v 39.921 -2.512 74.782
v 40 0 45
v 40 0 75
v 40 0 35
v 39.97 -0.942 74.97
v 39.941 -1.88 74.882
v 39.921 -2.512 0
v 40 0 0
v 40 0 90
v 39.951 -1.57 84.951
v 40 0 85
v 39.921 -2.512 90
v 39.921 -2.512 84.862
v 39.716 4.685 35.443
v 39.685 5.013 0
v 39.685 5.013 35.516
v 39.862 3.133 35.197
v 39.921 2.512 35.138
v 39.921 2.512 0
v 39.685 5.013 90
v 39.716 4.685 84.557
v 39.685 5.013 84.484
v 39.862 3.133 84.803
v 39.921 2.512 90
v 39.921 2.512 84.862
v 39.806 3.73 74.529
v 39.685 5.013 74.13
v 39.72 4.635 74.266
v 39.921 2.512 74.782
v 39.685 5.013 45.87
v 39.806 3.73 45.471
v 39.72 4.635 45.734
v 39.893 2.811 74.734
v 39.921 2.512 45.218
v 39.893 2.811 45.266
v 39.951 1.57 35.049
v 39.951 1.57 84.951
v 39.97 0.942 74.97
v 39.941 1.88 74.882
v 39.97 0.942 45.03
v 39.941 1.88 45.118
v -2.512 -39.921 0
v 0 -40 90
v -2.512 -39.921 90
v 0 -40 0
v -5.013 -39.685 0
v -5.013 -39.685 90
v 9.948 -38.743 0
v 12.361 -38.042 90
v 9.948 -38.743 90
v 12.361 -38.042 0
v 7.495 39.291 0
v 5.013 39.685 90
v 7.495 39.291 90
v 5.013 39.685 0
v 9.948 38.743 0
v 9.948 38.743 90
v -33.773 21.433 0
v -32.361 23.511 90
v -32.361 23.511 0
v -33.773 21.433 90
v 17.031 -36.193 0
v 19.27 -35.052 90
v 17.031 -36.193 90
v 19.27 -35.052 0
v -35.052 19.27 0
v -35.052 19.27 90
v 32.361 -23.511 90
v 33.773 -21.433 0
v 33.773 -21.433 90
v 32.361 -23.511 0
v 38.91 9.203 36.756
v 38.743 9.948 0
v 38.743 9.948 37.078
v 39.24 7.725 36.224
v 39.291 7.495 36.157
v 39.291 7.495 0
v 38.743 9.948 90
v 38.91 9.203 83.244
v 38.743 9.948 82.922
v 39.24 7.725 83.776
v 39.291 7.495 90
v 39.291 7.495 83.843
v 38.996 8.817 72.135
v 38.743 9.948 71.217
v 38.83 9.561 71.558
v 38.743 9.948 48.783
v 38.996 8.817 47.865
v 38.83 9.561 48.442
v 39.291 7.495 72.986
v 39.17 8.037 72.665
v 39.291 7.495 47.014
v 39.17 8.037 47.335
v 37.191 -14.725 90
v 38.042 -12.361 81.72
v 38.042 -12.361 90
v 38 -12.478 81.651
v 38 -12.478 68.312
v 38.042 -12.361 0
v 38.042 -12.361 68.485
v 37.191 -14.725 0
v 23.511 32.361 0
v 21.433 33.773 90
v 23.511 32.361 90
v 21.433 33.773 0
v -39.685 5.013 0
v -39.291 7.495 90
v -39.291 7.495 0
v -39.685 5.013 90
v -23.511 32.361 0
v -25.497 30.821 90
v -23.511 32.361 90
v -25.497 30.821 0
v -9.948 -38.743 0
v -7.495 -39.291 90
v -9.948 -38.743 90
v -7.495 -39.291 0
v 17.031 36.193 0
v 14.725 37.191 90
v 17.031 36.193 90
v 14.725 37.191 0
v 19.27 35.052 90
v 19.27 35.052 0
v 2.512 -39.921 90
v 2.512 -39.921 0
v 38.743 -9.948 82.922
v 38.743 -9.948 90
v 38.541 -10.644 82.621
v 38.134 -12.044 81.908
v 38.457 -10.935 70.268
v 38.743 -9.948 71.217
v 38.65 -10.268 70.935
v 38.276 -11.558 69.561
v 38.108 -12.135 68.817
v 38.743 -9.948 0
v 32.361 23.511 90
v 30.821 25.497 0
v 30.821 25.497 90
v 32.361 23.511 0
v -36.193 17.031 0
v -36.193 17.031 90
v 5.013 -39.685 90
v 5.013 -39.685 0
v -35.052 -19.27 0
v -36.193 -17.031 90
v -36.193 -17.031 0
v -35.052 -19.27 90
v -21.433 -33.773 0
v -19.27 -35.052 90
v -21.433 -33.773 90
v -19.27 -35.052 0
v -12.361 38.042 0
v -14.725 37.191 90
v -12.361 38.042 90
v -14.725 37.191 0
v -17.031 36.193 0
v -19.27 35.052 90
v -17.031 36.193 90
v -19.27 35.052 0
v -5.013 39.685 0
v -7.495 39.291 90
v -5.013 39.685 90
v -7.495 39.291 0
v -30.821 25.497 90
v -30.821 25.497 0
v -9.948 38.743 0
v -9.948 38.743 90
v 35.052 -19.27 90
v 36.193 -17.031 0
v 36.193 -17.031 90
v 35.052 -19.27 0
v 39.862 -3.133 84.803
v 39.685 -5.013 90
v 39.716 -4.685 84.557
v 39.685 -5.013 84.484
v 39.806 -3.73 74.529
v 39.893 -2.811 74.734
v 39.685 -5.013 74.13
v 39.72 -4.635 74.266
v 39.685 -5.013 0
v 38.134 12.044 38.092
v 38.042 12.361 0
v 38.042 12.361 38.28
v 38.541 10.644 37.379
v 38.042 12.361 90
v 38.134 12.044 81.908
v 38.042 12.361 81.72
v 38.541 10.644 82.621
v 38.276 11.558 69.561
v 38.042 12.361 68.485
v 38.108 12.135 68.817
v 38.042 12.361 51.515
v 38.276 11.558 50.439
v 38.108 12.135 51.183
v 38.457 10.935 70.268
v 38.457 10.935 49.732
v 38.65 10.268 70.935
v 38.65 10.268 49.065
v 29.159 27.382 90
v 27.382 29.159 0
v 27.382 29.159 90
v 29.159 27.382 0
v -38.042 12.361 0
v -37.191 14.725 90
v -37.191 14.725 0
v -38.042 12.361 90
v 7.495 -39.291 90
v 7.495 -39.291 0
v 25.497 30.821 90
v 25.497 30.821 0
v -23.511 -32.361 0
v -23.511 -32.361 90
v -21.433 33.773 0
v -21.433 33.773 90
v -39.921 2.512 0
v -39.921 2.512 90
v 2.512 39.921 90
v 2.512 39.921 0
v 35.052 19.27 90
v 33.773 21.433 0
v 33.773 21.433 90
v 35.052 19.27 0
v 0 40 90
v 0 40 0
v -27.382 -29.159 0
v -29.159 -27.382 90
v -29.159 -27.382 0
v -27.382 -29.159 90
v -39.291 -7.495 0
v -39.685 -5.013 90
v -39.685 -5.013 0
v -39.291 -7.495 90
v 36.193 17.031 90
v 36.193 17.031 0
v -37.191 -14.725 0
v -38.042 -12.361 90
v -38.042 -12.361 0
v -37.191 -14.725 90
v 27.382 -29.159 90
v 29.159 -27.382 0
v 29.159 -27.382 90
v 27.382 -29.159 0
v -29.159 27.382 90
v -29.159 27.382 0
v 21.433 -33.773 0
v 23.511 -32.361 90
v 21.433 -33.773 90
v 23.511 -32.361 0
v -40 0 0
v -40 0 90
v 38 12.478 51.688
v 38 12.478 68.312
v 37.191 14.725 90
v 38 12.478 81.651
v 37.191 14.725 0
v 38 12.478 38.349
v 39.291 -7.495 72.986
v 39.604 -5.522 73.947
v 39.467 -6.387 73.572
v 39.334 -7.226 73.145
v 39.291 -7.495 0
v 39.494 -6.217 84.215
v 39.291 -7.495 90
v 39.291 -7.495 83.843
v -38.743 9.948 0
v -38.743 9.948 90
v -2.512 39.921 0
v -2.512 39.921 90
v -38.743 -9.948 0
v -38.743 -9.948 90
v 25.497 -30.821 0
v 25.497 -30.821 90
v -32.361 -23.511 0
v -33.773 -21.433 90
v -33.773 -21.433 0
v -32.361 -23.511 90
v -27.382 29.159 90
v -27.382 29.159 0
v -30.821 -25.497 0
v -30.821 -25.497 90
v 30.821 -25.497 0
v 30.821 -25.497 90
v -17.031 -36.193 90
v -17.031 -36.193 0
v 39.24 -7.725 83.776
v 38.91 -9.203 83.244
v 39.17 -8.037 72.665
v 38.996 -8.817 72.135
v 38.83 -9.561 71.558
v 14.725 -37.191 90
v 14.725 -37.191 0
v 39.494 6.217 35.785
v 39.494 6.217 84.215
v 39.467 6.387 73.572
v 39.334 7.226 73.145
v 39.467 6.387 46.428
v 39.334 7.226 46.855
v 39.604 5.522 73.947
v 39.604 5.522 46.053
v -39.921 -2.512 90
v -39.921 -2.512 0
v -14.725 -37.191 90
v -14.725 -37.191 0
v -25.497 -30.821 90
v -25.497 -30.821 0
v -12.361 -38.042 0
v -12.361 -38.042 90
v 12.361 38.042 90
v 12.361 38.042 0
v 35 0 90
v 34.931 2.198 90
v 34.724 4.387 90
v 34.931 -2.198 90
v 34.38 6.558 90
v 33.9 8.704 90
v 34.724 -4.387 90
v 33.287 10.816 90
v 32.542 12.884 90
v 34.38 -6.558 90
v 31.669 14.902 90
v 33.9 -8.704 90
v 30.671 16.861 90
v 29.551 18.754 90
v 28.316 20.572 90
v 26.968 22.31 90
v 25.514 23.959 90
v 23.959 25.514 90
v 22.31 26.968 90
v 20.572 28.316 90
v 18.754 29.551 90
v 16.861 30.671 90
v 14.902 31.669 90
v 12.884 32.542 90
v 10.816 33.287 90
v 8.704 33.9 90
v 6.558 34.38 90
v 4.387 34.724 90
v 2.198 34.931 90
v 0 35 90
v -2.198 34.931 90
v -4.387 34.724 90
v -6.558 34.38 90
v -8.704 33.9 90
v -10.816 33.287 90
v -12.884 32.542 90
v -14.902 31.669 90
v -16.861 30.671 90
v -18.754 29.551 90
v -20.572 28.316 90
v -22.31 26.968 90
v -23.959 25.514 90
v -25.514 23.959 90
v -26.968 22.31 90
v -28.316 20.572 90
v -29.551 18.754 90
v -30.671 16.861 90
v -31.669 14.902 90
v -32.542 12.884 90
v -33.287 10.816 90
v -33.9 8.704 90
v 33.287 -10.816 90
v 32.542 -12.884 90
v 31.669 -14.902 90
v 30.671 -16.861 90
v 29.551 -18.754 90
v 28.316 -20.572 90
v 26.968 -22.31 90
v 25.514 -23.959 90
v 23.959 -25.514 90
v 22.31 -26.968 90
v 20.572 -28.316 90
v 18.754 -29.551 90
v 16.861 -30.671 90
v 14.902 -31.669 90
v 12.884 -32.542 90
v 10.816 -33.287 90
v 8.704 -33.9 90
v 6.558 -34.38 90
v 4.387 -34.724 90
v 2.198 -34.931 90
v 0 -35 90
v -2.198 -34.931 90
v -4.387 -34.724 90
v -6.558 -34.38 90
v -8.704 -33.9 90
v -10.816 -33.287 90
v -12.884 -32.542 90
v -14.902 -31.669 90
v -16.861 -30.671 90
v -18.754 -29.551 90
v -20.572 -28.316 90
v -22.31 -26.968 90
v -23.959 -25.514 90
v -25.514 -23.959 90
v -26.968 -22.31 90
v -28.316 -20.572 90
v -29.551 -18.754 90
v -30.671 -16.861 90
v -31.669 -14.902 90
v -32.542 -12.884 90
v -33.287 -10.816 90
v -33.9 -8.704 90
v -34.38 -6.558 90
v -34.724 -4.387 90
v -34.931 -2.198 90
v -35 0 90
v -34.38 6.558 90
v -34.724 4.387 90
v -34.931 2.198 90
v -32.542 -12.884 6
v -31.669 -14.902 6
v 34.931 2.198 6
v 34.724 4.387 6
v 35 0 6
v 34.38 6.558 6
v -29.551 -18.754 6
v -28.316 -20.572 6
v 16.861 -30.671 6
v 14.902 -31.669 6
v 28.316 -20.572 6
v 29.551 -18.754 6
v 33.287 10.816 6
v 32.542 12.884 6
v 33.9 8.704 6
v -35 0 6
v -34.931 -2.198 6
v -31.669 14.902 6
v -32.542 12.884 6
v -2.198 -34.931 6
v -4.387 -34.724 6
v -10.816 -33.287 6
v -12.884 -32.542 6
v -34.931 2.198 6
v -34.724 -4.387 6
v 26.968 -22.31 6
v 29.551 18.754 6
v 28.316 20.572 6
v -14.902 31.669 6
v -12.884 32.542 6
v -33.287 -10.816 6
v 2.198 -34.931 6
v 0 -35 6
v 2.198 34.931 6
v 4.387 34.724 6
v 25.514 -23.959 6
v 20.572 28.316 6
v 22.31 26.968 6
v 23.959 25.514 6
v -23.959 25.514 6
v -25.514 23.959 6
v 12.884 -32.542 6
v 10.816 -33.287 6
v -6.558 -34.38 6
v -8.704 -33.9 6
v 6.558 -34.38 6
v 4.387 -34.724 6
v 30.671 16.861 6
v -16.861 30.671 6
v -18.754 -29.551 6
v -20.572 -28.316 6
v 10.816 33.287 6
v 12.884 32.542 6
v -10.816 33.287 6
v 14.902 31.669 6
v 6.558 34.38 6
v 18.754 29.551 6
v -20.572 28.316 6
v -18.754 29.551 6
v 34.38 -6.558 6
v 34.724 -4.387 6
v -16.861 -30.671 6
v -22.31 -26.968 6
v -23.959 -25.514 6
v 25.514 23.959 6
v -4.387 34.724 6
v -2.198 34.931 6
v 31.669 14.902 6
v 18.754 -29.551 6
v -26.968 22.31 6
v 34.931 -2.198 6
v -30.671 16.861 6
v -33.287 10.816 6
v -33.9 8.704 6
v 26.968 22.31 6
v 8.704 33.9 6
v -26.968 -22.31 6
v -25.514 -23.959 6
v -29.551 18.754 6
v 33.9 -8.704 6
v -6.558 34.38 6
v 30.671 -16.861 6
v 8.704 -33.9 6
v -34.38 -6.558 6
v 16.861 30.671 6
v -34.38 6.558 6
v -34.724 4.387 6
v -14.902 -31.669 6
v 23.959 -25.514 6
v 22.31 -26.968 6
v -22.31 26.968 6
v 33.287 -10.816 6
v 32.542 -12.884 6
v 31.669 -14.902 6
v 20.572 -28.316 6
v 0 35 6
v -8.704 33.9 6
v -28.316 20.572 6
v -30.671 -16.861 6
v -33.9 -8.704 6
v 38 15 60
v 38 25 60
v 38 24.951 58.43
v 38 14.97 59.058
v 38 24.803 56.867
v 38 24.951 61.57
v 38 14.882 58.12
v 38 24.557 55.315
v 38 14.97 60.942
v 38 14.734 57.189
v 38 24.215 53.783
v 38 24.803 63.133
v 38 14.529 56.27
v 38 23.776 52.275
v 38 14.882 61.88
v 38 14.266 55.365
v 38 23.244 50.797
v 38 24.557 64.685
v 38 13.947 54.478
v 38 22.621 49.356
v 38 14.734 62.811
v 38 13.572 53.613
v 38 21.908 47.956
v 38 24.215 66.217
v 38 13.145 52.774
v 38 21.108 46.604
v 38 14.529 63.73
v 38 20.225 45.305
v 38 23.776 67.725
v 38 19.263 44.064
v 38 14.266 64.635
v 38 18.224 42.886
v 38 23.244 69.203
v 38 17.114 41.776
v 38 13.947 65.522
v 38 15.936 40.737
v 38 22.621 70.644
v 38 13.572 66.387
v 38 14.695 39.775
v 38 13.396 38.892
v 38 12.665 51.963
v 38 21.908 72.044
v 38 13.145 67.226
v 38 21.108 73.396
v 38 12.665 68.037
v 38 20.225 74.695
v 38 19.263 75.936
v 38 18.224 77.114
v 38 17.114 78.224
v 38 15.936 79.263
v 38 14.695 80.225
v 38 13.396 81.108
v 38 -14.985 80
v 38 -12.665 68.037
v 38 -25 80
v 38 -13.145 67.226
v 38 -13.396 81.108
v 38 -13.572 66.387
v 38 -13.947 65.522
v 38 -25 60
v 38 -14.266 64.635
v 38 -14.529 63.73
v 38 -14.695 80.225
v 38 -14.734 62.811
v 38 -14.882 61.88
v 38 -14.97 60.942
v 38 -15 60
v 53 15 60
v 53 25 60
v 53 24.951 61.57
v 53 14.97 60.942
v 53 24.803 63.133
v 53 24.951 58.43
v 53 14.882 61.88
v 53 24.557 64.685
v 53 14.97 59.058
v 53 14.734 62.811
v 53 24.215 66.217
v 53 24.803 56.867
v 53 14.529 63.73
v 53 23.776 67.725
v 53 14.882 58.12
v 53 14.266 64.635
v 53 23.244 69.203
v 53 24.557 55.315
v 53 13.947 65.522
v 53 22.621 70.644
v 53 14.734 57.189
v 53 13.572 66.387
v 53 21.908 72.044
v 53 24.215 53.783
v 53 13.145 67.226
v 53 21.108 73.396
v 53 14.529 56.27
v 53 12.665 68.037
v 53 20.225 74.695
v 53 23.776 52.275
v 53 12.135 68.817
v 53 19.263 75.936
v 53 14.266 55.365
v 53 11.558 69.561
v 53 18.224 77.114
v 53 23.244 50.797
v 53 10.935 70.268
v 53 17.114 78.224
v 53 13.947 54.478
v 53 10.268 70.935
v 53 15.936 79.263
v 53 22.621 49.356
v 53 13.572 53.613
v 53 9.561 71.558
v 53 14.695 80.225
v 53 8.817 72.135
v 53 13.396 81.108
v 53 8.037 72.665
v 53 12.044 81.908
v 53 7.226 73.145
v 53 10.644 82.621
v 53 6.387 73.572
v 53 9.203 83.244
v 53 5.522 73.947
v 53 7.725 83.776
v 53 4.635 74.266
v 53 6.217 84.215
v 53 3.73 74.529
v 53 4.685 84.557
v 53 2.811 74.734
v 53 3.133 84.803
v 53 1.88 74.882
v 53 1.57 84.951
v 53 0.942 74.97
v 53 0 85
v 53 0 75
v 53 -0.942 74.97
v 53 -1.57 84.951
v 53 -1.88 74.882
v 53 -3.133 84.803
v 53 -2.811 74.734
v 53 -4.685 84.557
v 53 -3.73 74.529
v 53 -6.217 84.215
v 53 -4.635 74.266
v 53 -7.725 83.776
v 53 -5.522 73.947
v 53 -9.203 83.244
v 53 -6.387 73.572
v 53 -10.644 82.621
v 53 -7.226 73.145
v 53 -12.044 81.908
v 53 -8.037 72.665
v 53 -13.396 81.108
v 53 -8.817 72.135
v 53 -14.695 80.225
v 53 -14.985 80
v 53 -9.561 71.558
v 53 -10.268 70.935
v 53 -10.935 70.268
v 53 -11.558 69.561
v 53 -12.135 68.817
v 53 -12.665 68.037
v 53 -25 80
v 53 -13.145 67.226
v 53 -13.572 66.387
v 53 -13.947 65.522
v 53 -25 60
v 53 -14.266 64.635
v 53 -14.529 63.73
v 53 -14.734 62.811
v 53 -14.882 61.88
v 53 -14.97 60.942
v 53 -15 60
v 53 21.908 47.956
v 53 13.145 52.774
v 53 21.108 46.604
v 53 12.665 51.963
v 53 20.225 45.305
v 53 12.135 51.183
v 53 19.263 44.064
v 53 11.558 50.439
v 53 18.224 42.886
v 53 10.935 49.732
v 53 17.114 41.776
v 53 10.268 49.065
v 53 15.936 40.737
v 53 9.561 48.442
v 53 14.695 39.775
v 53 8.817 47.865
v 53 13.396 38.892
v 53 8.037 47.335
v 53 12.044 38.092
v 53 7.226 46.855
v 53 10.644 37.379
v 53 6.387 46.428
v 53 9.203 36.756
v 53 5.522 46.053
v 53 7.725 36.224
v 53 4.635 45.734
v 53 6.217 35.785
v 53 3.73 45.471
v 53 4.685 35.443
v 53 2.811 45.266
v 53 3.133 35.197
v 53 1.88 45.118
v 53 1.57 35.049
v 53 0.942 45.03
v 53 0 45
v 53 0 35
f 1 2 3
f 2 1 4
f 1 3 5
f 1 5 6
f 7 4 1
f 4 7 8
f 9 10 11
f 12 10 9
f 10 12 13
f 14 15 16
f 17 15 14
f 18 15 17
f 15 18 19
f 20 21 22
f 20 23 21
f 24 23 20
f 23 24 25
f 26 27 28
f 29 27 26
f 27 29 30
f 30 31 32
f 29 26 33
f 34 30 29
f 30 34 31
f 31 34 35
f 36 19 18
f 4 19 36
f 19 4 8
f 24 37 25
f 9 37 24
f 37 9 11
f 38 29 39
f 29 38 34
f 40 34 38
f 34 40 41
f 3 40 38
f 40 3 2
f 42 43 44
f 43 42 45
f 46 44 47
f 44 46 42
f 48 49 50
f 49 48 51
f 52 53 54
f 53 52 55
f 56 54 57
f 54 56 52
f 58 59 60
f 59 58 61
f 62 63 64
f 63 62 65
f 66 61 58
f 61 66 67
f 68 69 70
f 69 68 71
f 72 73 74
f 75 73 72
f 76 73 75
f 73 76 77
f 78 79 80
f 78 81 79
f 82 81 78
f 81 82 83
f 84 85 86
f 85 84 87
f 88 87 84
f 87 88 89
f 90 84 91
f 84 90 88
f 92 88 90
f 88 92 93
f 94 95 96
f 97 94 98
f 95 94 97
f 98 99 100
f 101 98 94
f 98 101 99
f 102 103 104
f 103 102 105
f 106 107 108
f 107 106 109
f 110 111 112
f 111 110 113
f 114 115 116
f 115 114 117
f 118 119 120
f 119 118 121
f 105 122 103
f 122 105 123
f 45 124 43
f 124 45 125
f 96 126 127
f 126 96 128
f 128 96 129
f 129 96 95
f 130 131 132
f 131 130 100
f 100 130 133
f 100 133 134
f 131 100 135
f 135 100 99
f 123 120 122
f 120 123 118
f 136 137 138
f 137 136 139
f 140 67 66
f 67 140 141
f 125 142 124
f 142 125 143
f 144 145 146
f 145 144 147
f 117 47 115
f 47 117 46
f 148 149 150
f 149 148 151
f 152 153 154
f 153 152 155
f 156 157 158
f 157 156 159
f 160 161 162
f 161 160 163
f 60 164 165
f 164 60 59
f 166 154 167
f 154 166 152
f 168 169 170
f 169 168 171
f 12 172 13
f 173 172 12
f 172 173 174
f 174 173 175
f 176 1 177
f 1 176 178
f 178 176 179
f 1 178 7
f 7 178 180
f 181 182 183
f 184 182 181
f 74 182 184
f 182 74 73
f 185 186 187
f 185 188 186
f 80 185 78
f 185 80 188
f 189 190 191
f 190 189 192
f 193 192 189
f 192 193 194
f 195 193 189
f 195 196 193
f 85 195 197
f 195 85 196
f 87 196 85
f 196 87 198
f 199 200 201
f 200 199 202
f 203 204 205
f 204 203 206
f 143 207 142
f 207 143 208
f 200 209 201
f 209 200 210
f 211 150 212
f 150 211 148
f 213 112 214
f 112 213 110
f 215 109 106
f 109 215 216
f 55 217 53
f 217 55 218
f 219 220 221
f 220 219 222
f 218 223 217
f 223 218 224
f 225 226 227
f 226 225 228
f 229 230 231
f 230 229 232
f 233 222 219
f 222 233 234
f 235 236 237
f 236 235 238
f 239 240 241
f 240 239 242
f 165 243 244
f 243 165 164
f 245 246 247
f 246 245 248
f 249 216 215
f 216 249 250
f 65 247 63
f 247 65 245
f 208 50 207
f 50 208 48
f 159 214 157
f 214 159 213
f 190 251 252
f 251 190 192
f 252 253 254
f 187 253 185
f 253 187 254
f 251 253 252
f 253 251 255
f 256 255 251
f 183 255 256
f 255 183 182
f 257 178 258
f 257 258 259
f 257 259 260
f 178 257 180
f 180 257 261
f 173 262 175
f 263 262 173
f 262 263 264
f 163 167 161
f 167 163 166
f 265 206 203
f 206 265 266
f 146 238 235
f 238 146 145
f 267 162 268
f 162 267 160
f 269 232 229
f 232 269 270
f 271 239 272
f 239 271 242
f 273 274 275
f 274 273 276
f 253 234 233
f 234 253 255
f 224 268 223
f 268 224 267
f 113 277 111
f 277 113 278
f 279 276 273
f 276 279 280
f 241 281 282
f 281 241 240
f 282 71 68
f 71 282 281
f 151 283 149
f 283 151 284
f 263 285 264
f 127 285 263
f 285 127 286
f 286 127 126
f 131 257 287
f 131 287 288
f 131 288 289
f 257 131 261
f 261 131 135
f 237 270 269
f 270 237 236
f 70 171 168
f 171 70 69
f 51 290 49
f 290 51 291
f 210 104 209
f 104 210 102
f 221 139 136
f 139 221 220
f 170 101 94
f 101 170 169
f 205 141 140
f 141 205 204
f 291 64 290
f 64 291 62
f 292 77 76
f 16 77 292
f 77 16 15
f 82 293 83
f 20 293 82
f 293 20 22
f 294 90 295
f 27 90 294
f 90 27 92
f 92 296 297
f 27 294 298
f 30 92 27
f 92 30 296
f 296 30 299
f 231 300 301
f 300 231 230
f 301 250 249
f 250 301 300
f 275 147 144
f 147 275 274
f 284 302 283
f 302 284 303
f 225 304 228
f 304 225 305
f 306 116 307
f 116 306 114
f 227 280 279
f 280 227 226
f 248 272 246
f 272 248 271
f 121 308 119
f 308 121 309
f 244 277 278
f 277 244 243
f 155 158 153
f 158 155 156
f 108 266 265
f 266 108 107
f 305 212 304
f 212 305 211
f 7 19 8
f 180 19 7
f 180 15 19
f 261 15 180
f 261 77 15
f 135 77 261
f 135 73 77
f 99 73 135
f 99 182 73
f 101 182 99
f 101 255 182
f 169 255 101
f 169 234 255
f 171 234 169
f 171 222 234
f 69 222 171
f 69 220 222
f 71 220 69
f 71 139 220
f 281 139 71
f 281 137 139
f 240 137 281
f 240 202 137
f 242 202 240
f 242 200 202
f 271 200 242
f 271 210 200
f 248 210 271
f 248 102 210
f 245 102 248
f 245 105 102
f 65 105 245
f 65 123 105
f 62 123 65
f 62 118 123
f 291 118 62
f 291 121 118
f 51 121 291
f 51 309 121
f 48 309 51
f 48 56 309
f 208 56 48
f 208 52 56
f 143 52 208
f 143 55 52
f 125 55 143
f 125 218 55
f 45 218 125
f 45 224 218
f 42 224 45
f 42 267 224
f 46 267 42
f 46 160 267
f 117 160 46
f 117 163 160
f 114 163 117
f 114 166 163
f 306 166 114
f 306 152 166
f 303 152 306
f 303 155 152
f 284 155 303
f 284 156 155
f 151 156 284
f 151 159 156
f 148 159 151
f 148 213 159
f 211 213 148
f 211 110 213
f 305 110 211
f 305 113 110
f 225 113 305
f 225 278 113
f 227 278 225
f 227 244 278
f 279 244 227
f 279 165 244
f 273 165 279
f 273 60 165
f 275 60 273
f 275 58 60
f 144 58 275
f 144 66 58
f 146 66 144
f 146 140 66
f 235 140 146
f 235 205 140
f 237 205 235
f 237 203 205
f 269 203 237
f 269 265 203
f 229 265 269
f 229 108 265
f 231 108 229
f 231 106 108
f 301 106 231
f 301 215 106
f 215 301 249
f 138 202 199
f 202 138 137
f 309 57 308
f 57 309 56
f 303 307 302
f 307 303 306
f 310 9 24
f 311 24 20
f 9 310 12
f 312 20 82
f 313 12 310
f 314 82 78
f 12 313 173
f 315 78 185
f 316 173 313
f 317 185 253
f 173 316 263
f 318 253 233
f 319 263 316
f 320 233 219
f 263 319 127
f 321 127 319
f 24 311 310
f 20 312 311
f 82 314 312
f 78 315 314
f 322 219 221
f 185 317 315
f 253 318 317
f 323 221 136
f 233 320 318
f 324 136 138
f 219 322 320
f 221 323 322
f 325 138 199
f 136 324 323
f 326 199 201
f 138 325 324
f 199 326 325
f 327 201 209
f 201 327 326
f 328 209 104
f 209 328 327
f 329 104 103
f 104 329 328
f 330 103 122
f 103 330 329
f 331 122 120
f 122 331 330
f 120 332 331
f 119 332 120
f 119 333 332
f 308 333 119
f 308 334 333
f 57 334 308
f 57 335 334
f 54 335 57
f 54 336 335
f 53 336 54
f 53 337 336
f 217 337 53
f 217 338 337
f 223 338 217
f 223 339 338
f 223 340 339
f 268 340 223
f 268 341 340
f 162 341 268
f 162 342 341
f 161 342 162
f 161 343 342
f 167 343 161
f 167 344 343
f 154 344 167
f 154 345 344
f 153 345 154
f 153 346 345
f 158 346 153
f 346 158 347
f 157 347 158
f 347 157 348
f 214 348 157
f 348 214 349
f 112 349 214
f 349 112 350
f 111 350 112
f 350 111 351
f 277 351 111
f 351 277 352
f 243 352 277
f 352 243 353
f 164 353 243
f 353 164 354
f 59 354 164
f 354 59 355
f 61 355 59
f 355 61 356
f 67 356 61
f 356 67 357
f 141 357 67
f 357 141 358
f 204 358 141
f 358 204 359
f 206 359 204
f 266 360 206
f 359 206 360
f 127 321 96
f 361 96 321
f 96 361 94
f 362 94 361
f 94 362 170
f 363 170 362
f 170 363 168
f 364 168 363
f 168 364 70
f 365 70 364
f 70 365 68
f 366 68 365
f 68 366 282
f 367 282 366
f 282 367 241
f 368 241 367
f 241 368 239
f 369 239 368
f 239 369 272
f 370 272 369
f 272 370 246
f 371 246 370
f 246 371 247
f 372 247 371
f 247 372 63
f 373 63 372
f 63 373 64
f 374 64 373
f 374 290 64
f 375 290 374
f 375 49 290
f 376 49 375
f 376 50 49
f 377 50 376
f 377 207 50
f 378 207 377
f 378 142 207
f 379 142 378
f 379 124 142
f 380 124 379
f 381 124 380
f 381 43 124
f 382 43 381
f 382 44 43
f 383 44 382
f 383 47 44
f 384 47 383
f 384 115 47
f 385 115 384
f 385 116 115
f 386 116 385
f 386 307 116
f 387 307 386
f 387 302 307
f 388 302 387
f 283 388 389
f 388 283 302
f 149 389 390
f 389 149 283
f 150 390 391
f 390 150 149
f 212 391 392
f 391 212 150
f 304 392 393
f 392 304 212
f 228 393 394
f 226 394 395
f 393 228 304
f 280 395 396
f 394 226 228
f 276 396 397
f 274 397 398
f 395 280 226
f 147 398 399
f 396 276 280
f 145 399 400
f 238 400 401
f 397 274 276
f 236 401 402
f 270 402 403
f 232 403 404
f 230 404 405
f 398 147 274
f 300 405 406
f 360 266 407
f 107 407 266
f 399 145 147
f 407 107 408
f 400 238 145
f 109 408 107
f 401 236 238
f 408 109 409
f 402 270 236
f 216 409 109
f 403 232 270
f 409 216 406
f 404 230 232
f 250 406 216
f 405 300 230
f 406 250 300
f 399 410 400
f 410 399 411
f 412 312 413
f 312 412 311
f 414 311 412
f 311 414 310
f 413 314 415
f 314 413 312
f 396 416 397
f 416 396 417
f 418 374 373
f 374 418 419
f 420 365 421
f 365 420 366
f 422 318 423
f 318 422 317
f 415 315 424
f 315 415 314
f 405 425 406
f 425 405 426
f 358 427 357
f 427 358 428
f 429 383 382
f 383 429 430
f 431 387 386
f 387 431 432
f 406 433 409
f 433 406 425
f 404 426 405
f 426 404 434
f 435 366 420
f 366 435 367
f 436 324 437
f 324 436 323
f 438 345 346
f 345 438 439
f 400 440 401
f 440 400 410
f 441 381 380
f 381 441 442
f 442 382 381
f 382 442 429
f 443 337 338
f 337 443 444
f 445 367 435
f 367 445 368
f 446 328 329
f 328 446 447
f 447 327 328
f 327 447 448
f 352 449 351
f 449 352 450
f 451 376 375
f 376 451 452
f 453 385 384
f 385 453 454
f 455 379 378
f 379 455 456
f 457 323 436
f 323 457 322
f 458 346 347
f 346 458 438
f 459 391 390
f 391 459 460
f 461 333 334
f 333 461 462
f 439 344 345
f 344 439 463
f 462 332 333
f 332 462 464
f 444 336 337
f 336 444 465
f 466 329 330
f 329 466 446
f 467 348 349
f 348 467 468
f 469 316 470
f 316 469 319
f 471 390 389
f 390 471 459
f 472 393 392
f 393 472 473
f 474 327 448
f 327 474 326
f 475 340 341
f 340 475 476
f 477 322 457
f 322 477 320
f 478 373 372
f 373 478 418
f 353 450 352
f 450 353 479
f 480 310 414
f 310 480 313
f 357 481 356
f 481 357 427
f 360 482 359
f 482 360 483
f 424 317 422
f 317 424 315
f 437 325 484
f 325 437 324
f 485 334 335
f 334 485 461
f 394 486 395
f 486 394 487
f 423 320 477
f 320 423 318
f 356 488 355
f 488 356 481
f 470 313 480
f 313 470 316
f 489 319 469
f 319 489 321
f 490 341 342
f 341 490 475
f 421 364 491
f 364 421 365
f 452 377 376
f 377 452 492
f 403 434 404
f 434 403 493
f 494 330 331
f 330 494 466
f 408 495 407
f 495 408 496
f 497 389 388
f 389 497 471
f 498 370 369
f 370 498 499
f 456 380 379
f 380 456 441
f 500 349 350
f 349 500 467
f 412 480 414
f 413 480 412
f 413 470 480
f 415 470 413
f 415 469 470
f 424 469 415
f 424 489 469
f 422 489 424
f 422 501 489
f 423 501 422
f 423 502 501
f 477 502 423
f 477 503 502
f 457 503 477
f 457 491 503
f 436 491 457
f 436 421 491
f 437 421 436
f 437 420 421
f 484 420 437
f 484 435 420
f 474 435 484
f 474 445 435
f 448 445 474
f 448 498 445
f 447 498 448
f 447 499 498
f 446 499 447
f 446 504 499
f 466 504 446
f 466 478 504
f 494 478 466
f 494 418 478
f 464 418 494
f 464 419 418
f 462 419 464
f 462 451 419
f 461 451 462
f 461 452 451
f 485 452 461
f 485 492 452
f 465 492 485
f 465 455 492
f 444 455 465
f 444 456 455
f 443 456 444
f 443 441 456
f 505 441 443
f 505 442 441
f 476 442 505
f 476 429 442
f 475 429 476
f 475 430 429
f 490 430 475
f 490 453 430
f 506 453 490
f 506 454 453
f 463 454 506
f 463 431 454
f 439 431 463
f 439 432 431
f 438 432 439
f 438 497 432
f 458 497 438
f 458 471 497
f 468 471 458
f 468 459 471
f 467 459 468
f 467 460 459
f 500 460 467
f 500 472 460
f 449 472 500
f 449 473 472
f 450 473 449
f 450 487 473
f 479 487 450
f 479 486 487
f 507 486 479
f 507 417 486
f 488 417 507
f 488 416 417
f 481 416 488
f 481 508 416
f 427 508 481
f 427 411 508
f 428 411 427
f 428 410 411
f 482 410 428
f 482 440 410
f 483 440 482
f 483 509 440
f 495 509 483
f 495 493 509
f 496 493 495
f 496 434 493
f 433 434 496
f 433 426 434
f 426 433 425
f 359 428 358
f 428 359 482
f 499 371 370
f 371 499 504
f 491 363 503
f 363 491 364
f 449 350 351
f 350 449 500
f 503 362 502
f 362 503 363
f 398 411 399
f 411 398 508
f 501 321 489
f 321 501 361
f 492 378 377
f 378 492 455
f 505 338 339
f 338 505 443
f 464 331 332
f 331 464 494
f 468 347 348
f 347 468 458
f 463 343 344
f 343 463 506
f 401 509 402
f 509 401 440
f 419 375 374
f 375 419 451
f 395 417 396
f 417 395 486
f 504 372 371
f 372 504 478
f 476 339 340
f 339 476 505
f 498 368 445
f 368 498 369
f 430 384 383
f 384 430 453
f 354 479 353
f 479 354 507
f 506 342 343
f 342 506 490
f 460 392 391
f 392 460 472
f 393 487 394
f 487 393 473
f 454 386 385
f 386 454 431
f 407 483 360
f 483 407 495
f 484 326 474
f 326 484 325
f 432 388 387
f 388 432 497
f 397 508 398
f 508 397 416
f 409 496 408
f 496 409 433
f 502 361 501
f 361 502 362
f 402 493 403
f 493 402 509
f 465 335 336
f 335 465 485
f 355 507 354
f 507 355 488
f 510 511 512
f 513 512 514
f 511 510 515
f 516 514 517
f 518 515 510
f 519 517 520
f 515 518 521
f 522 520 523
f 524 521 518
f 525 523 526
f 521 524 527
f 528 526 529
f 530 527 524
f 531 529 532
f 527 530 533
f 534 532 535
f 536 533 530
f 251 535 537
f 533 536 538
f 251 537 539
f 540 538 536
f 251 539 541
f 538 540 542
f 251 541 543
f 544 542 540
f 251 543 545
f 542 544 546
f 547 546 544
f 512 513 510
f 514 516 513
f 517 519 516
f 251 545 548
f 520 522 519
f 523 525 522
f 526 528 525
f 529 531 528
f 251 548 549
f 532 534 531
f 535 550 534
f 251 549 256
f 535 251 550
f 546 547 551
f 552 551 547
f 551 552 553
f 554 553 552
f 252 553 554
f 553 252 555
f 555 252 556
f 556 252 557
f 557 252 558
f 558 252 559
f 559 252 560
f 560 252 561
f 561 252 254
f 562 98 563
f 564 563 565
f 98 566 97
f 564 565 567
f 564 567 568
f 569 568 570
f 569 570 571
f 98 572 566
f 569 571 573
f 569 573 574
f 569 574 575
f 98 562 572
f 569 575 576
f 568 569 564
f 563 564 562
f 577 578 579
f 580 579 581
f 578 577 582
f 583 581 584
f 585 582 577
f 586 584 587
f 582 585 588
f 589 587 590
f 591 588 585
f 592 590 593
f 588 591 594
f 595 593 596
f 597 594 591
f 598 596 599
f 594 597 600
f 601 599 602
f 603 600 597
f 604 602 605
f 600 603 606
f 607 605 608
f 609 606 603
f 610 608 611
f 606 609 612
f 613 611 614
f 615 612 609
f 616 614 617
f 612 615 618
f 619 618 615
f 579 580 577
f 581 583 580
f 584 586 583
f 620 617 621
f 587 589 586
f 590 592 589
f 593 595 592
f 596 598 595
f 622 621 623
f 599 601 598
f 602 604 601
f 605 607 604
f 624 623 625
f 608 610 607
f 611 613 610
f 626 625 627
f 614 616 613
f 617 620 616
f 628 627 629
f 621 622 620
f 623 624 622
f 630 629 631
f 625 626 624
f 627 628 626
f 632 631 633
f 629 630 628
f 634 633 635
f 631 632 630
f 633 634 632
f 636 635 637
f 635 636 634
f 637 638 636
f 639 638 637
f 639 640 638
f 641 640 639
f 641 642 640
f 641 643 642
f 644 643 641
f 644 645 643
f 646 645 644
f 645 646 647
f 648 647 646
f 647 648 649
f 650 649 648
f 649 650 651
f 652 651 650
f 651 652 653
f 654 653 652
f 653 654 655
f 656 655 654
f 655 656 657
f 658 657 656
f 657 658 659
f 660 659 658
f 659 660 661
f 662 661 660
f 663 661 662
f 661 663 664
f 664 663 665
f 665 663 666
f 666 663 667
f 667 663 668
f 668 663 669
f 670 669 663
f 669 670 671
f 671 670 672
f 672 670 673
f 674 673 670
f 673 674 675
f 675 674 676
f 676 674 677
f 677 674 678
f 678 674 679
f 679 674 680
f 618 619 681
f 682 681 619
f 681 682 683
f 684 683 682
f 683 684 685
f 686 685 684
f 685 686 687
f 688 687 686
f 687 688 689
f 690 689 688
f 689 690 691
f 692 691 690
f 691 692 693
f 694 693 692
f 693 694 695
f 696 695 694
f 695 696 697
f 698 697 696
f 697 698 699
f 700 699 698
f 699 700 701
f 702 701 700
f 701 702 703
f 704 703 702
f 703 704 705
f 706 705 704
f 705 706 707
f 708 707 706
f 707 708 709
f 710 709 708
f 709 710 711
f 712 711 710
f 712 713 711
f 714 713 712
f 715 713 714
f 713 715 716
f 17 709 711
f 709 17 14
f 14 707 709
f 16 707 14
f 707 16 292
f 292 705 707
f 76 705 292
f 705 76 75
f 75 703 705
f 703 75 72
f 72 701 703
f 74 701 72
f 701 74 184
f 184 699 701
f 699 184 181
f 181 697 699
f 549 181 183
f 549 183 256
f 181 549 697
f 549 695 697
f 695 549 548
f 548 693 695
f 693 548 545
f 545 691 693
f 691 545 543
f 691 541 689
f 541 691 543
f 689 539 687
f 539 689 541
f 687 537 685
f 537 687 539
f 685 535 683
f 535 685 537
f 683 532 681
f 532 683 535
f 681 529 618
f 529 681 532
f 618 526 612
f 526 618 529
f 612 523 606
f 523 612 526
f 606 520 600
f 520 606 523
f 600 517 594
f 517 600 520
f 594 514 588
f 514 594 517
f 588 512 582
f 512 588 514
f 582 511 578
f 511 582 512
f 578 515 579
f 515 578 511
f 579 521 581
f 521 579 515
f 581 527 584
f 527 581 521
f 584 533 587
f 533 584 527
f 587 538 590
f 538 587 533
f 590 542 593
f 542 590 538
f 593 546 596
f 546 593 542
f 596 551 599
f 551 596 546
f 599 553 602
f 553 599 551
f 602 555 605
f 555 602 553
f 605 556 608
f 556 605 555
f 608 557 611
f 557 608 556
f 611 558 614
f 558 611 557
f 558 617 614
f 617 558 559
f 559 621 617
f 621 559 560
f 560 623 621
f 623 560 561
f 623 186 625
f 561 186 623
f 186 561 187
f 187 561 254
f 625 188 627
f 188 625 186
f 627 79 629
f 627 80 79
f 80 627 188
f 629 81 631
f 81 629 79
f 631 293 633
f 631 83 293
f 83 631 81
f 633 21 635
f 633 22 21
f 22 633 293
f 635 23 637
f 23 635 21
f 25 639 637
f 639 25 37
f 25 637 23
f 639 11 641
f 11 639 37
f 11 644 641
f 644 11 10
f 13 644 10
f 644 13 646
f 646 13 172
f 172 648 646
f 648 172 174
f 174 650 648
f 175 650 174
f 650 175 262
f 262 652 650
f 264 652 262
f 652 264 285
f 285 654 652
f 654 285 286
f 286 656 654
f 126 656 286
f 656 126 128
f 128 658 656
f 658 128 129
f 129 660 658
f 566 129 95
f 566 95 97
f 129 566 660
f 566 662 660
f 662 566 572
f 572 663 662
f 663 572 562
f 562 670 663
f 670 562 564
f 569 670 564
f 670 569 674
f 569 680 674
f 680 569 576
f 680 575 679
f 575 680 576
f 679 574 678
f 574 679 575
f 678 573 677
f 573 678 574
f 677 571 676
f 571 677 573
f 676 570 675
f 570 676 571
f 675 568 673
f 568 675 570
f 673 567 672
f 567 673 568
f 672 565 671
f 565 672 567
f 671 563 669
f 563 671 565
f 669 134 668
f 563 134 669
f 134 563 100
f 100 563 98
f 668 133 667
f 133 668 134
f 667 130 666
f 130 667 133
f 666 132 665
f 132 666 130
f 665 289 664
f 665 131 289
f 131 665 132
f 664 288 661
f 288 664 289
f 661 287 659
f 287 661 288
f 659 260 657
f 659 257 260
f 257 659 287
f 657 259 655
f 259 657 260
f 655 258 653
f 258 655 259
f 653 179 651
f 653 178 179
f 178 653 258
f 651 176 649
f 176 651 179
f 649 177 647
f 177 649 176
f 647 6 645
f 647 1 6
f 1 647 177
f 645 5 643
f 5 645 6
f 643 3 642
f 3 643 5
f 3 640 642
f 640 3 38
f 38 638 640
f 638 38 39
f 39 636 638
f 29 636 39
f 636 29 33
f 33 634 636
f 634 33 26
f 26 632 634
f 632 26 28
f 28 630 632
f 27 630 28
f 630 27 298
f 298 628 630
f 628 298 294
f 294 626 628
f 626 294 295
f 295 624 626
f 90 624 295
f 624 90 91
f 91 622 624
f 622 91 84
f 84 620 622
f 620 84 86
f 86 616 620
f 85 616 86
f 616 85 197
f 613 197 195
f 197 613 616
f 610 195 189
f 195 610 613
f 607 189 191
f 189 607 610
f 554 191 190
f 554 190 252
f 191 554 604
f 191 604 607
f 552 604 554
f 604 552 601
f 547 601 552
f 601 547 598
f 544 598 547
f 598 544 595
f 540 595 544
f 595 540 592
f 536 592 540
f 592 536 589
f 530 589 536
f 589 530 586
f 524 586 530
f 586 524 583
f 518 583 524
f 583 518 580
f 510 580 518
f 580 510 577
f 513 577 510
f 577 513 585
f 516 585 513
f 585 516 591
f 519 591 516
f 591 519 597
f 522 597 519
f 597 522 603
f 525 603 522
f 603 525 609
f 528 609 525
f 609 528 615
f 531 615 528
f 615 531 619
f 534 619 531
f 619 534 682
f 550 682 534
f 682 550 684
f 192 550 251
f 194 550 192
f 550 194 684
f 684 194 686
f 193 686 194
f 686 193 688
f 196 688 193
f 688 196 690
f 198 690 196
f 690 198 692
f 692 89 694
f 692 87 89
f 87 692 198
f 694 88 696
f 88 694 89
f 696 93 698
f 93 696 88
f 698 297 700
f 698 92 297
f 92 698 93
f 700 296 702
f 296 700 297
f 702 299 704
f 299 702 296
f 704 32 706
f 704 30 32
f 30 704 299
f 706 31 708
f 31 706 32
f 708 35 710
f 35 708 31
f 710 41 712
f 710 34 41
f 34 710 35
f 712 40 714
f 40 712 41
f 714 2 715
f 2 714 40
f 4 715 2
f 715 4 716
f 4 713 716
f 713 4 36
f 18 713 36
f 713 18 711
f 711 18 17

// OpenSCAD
$fn = 100;

// マグ本体のパラメータ
outer_d = 80;
inner_d = 70;
height = 90;
bottom_thick = 6;

// 取手のパラメータ
handle_inner_h = 30; // 縦の空間
handle_inner_w = 25; // 横の張り出し空間
handle_thick = 10;   // 取手自体の肉厚
handle_width = 15;   // 取手の奥行き(押し出し厚み)

module mug_body() {
    difference() {
        cylinder(d = outer_d, h = height);
        translate([0, 0, bottom_thick])
            cylinder(d = inner_d, h = height - bottom_thick + 0.1);
    }
}

module handle() {
    // 取手の中心をマグの高さ中央に合わせる
    // D字形状をプロファイルとして作成
    translate([outer_d / 2 - 2, 0, height / 2]) {
        rotate([90, 0, 90]) {
            linear_extrude(height = handle_width) {
                difference() {
                    // 外形: 半円(幅は空間+肉厚*2)と直線部
                    union() {
                        translate([0, handle_inner_h/2]) circle(d = handle_inner_h + handle_thick * 2);
                        translate([-(handle_inner_h/2 + handle_thick), -handle_inner_h/2]) 
                            square([handle_inner_h/2 + handle_thick, handle_inner_h + handle_thick * 2]);
                    }
                    // 内穴: 半円
                    union() {
                        translate([0, handle_inner_h/2]) circle(d = handle_inner_h);
                        translate([-handle_inner_w, -handle_inner_h/2]) 
                            square([handle_inner_w, handle_inner_h]);
                    }
                }
            }
        }
    }
}

union() {
    mug_body();
    // 取手が本体と重なるように少しだけめり込ませてunion
    intersection() {
        handle();
        translate([outer_d/2 - 5, -50, 0]) cube([50, 100, 200]);
    }
    handle();
}
